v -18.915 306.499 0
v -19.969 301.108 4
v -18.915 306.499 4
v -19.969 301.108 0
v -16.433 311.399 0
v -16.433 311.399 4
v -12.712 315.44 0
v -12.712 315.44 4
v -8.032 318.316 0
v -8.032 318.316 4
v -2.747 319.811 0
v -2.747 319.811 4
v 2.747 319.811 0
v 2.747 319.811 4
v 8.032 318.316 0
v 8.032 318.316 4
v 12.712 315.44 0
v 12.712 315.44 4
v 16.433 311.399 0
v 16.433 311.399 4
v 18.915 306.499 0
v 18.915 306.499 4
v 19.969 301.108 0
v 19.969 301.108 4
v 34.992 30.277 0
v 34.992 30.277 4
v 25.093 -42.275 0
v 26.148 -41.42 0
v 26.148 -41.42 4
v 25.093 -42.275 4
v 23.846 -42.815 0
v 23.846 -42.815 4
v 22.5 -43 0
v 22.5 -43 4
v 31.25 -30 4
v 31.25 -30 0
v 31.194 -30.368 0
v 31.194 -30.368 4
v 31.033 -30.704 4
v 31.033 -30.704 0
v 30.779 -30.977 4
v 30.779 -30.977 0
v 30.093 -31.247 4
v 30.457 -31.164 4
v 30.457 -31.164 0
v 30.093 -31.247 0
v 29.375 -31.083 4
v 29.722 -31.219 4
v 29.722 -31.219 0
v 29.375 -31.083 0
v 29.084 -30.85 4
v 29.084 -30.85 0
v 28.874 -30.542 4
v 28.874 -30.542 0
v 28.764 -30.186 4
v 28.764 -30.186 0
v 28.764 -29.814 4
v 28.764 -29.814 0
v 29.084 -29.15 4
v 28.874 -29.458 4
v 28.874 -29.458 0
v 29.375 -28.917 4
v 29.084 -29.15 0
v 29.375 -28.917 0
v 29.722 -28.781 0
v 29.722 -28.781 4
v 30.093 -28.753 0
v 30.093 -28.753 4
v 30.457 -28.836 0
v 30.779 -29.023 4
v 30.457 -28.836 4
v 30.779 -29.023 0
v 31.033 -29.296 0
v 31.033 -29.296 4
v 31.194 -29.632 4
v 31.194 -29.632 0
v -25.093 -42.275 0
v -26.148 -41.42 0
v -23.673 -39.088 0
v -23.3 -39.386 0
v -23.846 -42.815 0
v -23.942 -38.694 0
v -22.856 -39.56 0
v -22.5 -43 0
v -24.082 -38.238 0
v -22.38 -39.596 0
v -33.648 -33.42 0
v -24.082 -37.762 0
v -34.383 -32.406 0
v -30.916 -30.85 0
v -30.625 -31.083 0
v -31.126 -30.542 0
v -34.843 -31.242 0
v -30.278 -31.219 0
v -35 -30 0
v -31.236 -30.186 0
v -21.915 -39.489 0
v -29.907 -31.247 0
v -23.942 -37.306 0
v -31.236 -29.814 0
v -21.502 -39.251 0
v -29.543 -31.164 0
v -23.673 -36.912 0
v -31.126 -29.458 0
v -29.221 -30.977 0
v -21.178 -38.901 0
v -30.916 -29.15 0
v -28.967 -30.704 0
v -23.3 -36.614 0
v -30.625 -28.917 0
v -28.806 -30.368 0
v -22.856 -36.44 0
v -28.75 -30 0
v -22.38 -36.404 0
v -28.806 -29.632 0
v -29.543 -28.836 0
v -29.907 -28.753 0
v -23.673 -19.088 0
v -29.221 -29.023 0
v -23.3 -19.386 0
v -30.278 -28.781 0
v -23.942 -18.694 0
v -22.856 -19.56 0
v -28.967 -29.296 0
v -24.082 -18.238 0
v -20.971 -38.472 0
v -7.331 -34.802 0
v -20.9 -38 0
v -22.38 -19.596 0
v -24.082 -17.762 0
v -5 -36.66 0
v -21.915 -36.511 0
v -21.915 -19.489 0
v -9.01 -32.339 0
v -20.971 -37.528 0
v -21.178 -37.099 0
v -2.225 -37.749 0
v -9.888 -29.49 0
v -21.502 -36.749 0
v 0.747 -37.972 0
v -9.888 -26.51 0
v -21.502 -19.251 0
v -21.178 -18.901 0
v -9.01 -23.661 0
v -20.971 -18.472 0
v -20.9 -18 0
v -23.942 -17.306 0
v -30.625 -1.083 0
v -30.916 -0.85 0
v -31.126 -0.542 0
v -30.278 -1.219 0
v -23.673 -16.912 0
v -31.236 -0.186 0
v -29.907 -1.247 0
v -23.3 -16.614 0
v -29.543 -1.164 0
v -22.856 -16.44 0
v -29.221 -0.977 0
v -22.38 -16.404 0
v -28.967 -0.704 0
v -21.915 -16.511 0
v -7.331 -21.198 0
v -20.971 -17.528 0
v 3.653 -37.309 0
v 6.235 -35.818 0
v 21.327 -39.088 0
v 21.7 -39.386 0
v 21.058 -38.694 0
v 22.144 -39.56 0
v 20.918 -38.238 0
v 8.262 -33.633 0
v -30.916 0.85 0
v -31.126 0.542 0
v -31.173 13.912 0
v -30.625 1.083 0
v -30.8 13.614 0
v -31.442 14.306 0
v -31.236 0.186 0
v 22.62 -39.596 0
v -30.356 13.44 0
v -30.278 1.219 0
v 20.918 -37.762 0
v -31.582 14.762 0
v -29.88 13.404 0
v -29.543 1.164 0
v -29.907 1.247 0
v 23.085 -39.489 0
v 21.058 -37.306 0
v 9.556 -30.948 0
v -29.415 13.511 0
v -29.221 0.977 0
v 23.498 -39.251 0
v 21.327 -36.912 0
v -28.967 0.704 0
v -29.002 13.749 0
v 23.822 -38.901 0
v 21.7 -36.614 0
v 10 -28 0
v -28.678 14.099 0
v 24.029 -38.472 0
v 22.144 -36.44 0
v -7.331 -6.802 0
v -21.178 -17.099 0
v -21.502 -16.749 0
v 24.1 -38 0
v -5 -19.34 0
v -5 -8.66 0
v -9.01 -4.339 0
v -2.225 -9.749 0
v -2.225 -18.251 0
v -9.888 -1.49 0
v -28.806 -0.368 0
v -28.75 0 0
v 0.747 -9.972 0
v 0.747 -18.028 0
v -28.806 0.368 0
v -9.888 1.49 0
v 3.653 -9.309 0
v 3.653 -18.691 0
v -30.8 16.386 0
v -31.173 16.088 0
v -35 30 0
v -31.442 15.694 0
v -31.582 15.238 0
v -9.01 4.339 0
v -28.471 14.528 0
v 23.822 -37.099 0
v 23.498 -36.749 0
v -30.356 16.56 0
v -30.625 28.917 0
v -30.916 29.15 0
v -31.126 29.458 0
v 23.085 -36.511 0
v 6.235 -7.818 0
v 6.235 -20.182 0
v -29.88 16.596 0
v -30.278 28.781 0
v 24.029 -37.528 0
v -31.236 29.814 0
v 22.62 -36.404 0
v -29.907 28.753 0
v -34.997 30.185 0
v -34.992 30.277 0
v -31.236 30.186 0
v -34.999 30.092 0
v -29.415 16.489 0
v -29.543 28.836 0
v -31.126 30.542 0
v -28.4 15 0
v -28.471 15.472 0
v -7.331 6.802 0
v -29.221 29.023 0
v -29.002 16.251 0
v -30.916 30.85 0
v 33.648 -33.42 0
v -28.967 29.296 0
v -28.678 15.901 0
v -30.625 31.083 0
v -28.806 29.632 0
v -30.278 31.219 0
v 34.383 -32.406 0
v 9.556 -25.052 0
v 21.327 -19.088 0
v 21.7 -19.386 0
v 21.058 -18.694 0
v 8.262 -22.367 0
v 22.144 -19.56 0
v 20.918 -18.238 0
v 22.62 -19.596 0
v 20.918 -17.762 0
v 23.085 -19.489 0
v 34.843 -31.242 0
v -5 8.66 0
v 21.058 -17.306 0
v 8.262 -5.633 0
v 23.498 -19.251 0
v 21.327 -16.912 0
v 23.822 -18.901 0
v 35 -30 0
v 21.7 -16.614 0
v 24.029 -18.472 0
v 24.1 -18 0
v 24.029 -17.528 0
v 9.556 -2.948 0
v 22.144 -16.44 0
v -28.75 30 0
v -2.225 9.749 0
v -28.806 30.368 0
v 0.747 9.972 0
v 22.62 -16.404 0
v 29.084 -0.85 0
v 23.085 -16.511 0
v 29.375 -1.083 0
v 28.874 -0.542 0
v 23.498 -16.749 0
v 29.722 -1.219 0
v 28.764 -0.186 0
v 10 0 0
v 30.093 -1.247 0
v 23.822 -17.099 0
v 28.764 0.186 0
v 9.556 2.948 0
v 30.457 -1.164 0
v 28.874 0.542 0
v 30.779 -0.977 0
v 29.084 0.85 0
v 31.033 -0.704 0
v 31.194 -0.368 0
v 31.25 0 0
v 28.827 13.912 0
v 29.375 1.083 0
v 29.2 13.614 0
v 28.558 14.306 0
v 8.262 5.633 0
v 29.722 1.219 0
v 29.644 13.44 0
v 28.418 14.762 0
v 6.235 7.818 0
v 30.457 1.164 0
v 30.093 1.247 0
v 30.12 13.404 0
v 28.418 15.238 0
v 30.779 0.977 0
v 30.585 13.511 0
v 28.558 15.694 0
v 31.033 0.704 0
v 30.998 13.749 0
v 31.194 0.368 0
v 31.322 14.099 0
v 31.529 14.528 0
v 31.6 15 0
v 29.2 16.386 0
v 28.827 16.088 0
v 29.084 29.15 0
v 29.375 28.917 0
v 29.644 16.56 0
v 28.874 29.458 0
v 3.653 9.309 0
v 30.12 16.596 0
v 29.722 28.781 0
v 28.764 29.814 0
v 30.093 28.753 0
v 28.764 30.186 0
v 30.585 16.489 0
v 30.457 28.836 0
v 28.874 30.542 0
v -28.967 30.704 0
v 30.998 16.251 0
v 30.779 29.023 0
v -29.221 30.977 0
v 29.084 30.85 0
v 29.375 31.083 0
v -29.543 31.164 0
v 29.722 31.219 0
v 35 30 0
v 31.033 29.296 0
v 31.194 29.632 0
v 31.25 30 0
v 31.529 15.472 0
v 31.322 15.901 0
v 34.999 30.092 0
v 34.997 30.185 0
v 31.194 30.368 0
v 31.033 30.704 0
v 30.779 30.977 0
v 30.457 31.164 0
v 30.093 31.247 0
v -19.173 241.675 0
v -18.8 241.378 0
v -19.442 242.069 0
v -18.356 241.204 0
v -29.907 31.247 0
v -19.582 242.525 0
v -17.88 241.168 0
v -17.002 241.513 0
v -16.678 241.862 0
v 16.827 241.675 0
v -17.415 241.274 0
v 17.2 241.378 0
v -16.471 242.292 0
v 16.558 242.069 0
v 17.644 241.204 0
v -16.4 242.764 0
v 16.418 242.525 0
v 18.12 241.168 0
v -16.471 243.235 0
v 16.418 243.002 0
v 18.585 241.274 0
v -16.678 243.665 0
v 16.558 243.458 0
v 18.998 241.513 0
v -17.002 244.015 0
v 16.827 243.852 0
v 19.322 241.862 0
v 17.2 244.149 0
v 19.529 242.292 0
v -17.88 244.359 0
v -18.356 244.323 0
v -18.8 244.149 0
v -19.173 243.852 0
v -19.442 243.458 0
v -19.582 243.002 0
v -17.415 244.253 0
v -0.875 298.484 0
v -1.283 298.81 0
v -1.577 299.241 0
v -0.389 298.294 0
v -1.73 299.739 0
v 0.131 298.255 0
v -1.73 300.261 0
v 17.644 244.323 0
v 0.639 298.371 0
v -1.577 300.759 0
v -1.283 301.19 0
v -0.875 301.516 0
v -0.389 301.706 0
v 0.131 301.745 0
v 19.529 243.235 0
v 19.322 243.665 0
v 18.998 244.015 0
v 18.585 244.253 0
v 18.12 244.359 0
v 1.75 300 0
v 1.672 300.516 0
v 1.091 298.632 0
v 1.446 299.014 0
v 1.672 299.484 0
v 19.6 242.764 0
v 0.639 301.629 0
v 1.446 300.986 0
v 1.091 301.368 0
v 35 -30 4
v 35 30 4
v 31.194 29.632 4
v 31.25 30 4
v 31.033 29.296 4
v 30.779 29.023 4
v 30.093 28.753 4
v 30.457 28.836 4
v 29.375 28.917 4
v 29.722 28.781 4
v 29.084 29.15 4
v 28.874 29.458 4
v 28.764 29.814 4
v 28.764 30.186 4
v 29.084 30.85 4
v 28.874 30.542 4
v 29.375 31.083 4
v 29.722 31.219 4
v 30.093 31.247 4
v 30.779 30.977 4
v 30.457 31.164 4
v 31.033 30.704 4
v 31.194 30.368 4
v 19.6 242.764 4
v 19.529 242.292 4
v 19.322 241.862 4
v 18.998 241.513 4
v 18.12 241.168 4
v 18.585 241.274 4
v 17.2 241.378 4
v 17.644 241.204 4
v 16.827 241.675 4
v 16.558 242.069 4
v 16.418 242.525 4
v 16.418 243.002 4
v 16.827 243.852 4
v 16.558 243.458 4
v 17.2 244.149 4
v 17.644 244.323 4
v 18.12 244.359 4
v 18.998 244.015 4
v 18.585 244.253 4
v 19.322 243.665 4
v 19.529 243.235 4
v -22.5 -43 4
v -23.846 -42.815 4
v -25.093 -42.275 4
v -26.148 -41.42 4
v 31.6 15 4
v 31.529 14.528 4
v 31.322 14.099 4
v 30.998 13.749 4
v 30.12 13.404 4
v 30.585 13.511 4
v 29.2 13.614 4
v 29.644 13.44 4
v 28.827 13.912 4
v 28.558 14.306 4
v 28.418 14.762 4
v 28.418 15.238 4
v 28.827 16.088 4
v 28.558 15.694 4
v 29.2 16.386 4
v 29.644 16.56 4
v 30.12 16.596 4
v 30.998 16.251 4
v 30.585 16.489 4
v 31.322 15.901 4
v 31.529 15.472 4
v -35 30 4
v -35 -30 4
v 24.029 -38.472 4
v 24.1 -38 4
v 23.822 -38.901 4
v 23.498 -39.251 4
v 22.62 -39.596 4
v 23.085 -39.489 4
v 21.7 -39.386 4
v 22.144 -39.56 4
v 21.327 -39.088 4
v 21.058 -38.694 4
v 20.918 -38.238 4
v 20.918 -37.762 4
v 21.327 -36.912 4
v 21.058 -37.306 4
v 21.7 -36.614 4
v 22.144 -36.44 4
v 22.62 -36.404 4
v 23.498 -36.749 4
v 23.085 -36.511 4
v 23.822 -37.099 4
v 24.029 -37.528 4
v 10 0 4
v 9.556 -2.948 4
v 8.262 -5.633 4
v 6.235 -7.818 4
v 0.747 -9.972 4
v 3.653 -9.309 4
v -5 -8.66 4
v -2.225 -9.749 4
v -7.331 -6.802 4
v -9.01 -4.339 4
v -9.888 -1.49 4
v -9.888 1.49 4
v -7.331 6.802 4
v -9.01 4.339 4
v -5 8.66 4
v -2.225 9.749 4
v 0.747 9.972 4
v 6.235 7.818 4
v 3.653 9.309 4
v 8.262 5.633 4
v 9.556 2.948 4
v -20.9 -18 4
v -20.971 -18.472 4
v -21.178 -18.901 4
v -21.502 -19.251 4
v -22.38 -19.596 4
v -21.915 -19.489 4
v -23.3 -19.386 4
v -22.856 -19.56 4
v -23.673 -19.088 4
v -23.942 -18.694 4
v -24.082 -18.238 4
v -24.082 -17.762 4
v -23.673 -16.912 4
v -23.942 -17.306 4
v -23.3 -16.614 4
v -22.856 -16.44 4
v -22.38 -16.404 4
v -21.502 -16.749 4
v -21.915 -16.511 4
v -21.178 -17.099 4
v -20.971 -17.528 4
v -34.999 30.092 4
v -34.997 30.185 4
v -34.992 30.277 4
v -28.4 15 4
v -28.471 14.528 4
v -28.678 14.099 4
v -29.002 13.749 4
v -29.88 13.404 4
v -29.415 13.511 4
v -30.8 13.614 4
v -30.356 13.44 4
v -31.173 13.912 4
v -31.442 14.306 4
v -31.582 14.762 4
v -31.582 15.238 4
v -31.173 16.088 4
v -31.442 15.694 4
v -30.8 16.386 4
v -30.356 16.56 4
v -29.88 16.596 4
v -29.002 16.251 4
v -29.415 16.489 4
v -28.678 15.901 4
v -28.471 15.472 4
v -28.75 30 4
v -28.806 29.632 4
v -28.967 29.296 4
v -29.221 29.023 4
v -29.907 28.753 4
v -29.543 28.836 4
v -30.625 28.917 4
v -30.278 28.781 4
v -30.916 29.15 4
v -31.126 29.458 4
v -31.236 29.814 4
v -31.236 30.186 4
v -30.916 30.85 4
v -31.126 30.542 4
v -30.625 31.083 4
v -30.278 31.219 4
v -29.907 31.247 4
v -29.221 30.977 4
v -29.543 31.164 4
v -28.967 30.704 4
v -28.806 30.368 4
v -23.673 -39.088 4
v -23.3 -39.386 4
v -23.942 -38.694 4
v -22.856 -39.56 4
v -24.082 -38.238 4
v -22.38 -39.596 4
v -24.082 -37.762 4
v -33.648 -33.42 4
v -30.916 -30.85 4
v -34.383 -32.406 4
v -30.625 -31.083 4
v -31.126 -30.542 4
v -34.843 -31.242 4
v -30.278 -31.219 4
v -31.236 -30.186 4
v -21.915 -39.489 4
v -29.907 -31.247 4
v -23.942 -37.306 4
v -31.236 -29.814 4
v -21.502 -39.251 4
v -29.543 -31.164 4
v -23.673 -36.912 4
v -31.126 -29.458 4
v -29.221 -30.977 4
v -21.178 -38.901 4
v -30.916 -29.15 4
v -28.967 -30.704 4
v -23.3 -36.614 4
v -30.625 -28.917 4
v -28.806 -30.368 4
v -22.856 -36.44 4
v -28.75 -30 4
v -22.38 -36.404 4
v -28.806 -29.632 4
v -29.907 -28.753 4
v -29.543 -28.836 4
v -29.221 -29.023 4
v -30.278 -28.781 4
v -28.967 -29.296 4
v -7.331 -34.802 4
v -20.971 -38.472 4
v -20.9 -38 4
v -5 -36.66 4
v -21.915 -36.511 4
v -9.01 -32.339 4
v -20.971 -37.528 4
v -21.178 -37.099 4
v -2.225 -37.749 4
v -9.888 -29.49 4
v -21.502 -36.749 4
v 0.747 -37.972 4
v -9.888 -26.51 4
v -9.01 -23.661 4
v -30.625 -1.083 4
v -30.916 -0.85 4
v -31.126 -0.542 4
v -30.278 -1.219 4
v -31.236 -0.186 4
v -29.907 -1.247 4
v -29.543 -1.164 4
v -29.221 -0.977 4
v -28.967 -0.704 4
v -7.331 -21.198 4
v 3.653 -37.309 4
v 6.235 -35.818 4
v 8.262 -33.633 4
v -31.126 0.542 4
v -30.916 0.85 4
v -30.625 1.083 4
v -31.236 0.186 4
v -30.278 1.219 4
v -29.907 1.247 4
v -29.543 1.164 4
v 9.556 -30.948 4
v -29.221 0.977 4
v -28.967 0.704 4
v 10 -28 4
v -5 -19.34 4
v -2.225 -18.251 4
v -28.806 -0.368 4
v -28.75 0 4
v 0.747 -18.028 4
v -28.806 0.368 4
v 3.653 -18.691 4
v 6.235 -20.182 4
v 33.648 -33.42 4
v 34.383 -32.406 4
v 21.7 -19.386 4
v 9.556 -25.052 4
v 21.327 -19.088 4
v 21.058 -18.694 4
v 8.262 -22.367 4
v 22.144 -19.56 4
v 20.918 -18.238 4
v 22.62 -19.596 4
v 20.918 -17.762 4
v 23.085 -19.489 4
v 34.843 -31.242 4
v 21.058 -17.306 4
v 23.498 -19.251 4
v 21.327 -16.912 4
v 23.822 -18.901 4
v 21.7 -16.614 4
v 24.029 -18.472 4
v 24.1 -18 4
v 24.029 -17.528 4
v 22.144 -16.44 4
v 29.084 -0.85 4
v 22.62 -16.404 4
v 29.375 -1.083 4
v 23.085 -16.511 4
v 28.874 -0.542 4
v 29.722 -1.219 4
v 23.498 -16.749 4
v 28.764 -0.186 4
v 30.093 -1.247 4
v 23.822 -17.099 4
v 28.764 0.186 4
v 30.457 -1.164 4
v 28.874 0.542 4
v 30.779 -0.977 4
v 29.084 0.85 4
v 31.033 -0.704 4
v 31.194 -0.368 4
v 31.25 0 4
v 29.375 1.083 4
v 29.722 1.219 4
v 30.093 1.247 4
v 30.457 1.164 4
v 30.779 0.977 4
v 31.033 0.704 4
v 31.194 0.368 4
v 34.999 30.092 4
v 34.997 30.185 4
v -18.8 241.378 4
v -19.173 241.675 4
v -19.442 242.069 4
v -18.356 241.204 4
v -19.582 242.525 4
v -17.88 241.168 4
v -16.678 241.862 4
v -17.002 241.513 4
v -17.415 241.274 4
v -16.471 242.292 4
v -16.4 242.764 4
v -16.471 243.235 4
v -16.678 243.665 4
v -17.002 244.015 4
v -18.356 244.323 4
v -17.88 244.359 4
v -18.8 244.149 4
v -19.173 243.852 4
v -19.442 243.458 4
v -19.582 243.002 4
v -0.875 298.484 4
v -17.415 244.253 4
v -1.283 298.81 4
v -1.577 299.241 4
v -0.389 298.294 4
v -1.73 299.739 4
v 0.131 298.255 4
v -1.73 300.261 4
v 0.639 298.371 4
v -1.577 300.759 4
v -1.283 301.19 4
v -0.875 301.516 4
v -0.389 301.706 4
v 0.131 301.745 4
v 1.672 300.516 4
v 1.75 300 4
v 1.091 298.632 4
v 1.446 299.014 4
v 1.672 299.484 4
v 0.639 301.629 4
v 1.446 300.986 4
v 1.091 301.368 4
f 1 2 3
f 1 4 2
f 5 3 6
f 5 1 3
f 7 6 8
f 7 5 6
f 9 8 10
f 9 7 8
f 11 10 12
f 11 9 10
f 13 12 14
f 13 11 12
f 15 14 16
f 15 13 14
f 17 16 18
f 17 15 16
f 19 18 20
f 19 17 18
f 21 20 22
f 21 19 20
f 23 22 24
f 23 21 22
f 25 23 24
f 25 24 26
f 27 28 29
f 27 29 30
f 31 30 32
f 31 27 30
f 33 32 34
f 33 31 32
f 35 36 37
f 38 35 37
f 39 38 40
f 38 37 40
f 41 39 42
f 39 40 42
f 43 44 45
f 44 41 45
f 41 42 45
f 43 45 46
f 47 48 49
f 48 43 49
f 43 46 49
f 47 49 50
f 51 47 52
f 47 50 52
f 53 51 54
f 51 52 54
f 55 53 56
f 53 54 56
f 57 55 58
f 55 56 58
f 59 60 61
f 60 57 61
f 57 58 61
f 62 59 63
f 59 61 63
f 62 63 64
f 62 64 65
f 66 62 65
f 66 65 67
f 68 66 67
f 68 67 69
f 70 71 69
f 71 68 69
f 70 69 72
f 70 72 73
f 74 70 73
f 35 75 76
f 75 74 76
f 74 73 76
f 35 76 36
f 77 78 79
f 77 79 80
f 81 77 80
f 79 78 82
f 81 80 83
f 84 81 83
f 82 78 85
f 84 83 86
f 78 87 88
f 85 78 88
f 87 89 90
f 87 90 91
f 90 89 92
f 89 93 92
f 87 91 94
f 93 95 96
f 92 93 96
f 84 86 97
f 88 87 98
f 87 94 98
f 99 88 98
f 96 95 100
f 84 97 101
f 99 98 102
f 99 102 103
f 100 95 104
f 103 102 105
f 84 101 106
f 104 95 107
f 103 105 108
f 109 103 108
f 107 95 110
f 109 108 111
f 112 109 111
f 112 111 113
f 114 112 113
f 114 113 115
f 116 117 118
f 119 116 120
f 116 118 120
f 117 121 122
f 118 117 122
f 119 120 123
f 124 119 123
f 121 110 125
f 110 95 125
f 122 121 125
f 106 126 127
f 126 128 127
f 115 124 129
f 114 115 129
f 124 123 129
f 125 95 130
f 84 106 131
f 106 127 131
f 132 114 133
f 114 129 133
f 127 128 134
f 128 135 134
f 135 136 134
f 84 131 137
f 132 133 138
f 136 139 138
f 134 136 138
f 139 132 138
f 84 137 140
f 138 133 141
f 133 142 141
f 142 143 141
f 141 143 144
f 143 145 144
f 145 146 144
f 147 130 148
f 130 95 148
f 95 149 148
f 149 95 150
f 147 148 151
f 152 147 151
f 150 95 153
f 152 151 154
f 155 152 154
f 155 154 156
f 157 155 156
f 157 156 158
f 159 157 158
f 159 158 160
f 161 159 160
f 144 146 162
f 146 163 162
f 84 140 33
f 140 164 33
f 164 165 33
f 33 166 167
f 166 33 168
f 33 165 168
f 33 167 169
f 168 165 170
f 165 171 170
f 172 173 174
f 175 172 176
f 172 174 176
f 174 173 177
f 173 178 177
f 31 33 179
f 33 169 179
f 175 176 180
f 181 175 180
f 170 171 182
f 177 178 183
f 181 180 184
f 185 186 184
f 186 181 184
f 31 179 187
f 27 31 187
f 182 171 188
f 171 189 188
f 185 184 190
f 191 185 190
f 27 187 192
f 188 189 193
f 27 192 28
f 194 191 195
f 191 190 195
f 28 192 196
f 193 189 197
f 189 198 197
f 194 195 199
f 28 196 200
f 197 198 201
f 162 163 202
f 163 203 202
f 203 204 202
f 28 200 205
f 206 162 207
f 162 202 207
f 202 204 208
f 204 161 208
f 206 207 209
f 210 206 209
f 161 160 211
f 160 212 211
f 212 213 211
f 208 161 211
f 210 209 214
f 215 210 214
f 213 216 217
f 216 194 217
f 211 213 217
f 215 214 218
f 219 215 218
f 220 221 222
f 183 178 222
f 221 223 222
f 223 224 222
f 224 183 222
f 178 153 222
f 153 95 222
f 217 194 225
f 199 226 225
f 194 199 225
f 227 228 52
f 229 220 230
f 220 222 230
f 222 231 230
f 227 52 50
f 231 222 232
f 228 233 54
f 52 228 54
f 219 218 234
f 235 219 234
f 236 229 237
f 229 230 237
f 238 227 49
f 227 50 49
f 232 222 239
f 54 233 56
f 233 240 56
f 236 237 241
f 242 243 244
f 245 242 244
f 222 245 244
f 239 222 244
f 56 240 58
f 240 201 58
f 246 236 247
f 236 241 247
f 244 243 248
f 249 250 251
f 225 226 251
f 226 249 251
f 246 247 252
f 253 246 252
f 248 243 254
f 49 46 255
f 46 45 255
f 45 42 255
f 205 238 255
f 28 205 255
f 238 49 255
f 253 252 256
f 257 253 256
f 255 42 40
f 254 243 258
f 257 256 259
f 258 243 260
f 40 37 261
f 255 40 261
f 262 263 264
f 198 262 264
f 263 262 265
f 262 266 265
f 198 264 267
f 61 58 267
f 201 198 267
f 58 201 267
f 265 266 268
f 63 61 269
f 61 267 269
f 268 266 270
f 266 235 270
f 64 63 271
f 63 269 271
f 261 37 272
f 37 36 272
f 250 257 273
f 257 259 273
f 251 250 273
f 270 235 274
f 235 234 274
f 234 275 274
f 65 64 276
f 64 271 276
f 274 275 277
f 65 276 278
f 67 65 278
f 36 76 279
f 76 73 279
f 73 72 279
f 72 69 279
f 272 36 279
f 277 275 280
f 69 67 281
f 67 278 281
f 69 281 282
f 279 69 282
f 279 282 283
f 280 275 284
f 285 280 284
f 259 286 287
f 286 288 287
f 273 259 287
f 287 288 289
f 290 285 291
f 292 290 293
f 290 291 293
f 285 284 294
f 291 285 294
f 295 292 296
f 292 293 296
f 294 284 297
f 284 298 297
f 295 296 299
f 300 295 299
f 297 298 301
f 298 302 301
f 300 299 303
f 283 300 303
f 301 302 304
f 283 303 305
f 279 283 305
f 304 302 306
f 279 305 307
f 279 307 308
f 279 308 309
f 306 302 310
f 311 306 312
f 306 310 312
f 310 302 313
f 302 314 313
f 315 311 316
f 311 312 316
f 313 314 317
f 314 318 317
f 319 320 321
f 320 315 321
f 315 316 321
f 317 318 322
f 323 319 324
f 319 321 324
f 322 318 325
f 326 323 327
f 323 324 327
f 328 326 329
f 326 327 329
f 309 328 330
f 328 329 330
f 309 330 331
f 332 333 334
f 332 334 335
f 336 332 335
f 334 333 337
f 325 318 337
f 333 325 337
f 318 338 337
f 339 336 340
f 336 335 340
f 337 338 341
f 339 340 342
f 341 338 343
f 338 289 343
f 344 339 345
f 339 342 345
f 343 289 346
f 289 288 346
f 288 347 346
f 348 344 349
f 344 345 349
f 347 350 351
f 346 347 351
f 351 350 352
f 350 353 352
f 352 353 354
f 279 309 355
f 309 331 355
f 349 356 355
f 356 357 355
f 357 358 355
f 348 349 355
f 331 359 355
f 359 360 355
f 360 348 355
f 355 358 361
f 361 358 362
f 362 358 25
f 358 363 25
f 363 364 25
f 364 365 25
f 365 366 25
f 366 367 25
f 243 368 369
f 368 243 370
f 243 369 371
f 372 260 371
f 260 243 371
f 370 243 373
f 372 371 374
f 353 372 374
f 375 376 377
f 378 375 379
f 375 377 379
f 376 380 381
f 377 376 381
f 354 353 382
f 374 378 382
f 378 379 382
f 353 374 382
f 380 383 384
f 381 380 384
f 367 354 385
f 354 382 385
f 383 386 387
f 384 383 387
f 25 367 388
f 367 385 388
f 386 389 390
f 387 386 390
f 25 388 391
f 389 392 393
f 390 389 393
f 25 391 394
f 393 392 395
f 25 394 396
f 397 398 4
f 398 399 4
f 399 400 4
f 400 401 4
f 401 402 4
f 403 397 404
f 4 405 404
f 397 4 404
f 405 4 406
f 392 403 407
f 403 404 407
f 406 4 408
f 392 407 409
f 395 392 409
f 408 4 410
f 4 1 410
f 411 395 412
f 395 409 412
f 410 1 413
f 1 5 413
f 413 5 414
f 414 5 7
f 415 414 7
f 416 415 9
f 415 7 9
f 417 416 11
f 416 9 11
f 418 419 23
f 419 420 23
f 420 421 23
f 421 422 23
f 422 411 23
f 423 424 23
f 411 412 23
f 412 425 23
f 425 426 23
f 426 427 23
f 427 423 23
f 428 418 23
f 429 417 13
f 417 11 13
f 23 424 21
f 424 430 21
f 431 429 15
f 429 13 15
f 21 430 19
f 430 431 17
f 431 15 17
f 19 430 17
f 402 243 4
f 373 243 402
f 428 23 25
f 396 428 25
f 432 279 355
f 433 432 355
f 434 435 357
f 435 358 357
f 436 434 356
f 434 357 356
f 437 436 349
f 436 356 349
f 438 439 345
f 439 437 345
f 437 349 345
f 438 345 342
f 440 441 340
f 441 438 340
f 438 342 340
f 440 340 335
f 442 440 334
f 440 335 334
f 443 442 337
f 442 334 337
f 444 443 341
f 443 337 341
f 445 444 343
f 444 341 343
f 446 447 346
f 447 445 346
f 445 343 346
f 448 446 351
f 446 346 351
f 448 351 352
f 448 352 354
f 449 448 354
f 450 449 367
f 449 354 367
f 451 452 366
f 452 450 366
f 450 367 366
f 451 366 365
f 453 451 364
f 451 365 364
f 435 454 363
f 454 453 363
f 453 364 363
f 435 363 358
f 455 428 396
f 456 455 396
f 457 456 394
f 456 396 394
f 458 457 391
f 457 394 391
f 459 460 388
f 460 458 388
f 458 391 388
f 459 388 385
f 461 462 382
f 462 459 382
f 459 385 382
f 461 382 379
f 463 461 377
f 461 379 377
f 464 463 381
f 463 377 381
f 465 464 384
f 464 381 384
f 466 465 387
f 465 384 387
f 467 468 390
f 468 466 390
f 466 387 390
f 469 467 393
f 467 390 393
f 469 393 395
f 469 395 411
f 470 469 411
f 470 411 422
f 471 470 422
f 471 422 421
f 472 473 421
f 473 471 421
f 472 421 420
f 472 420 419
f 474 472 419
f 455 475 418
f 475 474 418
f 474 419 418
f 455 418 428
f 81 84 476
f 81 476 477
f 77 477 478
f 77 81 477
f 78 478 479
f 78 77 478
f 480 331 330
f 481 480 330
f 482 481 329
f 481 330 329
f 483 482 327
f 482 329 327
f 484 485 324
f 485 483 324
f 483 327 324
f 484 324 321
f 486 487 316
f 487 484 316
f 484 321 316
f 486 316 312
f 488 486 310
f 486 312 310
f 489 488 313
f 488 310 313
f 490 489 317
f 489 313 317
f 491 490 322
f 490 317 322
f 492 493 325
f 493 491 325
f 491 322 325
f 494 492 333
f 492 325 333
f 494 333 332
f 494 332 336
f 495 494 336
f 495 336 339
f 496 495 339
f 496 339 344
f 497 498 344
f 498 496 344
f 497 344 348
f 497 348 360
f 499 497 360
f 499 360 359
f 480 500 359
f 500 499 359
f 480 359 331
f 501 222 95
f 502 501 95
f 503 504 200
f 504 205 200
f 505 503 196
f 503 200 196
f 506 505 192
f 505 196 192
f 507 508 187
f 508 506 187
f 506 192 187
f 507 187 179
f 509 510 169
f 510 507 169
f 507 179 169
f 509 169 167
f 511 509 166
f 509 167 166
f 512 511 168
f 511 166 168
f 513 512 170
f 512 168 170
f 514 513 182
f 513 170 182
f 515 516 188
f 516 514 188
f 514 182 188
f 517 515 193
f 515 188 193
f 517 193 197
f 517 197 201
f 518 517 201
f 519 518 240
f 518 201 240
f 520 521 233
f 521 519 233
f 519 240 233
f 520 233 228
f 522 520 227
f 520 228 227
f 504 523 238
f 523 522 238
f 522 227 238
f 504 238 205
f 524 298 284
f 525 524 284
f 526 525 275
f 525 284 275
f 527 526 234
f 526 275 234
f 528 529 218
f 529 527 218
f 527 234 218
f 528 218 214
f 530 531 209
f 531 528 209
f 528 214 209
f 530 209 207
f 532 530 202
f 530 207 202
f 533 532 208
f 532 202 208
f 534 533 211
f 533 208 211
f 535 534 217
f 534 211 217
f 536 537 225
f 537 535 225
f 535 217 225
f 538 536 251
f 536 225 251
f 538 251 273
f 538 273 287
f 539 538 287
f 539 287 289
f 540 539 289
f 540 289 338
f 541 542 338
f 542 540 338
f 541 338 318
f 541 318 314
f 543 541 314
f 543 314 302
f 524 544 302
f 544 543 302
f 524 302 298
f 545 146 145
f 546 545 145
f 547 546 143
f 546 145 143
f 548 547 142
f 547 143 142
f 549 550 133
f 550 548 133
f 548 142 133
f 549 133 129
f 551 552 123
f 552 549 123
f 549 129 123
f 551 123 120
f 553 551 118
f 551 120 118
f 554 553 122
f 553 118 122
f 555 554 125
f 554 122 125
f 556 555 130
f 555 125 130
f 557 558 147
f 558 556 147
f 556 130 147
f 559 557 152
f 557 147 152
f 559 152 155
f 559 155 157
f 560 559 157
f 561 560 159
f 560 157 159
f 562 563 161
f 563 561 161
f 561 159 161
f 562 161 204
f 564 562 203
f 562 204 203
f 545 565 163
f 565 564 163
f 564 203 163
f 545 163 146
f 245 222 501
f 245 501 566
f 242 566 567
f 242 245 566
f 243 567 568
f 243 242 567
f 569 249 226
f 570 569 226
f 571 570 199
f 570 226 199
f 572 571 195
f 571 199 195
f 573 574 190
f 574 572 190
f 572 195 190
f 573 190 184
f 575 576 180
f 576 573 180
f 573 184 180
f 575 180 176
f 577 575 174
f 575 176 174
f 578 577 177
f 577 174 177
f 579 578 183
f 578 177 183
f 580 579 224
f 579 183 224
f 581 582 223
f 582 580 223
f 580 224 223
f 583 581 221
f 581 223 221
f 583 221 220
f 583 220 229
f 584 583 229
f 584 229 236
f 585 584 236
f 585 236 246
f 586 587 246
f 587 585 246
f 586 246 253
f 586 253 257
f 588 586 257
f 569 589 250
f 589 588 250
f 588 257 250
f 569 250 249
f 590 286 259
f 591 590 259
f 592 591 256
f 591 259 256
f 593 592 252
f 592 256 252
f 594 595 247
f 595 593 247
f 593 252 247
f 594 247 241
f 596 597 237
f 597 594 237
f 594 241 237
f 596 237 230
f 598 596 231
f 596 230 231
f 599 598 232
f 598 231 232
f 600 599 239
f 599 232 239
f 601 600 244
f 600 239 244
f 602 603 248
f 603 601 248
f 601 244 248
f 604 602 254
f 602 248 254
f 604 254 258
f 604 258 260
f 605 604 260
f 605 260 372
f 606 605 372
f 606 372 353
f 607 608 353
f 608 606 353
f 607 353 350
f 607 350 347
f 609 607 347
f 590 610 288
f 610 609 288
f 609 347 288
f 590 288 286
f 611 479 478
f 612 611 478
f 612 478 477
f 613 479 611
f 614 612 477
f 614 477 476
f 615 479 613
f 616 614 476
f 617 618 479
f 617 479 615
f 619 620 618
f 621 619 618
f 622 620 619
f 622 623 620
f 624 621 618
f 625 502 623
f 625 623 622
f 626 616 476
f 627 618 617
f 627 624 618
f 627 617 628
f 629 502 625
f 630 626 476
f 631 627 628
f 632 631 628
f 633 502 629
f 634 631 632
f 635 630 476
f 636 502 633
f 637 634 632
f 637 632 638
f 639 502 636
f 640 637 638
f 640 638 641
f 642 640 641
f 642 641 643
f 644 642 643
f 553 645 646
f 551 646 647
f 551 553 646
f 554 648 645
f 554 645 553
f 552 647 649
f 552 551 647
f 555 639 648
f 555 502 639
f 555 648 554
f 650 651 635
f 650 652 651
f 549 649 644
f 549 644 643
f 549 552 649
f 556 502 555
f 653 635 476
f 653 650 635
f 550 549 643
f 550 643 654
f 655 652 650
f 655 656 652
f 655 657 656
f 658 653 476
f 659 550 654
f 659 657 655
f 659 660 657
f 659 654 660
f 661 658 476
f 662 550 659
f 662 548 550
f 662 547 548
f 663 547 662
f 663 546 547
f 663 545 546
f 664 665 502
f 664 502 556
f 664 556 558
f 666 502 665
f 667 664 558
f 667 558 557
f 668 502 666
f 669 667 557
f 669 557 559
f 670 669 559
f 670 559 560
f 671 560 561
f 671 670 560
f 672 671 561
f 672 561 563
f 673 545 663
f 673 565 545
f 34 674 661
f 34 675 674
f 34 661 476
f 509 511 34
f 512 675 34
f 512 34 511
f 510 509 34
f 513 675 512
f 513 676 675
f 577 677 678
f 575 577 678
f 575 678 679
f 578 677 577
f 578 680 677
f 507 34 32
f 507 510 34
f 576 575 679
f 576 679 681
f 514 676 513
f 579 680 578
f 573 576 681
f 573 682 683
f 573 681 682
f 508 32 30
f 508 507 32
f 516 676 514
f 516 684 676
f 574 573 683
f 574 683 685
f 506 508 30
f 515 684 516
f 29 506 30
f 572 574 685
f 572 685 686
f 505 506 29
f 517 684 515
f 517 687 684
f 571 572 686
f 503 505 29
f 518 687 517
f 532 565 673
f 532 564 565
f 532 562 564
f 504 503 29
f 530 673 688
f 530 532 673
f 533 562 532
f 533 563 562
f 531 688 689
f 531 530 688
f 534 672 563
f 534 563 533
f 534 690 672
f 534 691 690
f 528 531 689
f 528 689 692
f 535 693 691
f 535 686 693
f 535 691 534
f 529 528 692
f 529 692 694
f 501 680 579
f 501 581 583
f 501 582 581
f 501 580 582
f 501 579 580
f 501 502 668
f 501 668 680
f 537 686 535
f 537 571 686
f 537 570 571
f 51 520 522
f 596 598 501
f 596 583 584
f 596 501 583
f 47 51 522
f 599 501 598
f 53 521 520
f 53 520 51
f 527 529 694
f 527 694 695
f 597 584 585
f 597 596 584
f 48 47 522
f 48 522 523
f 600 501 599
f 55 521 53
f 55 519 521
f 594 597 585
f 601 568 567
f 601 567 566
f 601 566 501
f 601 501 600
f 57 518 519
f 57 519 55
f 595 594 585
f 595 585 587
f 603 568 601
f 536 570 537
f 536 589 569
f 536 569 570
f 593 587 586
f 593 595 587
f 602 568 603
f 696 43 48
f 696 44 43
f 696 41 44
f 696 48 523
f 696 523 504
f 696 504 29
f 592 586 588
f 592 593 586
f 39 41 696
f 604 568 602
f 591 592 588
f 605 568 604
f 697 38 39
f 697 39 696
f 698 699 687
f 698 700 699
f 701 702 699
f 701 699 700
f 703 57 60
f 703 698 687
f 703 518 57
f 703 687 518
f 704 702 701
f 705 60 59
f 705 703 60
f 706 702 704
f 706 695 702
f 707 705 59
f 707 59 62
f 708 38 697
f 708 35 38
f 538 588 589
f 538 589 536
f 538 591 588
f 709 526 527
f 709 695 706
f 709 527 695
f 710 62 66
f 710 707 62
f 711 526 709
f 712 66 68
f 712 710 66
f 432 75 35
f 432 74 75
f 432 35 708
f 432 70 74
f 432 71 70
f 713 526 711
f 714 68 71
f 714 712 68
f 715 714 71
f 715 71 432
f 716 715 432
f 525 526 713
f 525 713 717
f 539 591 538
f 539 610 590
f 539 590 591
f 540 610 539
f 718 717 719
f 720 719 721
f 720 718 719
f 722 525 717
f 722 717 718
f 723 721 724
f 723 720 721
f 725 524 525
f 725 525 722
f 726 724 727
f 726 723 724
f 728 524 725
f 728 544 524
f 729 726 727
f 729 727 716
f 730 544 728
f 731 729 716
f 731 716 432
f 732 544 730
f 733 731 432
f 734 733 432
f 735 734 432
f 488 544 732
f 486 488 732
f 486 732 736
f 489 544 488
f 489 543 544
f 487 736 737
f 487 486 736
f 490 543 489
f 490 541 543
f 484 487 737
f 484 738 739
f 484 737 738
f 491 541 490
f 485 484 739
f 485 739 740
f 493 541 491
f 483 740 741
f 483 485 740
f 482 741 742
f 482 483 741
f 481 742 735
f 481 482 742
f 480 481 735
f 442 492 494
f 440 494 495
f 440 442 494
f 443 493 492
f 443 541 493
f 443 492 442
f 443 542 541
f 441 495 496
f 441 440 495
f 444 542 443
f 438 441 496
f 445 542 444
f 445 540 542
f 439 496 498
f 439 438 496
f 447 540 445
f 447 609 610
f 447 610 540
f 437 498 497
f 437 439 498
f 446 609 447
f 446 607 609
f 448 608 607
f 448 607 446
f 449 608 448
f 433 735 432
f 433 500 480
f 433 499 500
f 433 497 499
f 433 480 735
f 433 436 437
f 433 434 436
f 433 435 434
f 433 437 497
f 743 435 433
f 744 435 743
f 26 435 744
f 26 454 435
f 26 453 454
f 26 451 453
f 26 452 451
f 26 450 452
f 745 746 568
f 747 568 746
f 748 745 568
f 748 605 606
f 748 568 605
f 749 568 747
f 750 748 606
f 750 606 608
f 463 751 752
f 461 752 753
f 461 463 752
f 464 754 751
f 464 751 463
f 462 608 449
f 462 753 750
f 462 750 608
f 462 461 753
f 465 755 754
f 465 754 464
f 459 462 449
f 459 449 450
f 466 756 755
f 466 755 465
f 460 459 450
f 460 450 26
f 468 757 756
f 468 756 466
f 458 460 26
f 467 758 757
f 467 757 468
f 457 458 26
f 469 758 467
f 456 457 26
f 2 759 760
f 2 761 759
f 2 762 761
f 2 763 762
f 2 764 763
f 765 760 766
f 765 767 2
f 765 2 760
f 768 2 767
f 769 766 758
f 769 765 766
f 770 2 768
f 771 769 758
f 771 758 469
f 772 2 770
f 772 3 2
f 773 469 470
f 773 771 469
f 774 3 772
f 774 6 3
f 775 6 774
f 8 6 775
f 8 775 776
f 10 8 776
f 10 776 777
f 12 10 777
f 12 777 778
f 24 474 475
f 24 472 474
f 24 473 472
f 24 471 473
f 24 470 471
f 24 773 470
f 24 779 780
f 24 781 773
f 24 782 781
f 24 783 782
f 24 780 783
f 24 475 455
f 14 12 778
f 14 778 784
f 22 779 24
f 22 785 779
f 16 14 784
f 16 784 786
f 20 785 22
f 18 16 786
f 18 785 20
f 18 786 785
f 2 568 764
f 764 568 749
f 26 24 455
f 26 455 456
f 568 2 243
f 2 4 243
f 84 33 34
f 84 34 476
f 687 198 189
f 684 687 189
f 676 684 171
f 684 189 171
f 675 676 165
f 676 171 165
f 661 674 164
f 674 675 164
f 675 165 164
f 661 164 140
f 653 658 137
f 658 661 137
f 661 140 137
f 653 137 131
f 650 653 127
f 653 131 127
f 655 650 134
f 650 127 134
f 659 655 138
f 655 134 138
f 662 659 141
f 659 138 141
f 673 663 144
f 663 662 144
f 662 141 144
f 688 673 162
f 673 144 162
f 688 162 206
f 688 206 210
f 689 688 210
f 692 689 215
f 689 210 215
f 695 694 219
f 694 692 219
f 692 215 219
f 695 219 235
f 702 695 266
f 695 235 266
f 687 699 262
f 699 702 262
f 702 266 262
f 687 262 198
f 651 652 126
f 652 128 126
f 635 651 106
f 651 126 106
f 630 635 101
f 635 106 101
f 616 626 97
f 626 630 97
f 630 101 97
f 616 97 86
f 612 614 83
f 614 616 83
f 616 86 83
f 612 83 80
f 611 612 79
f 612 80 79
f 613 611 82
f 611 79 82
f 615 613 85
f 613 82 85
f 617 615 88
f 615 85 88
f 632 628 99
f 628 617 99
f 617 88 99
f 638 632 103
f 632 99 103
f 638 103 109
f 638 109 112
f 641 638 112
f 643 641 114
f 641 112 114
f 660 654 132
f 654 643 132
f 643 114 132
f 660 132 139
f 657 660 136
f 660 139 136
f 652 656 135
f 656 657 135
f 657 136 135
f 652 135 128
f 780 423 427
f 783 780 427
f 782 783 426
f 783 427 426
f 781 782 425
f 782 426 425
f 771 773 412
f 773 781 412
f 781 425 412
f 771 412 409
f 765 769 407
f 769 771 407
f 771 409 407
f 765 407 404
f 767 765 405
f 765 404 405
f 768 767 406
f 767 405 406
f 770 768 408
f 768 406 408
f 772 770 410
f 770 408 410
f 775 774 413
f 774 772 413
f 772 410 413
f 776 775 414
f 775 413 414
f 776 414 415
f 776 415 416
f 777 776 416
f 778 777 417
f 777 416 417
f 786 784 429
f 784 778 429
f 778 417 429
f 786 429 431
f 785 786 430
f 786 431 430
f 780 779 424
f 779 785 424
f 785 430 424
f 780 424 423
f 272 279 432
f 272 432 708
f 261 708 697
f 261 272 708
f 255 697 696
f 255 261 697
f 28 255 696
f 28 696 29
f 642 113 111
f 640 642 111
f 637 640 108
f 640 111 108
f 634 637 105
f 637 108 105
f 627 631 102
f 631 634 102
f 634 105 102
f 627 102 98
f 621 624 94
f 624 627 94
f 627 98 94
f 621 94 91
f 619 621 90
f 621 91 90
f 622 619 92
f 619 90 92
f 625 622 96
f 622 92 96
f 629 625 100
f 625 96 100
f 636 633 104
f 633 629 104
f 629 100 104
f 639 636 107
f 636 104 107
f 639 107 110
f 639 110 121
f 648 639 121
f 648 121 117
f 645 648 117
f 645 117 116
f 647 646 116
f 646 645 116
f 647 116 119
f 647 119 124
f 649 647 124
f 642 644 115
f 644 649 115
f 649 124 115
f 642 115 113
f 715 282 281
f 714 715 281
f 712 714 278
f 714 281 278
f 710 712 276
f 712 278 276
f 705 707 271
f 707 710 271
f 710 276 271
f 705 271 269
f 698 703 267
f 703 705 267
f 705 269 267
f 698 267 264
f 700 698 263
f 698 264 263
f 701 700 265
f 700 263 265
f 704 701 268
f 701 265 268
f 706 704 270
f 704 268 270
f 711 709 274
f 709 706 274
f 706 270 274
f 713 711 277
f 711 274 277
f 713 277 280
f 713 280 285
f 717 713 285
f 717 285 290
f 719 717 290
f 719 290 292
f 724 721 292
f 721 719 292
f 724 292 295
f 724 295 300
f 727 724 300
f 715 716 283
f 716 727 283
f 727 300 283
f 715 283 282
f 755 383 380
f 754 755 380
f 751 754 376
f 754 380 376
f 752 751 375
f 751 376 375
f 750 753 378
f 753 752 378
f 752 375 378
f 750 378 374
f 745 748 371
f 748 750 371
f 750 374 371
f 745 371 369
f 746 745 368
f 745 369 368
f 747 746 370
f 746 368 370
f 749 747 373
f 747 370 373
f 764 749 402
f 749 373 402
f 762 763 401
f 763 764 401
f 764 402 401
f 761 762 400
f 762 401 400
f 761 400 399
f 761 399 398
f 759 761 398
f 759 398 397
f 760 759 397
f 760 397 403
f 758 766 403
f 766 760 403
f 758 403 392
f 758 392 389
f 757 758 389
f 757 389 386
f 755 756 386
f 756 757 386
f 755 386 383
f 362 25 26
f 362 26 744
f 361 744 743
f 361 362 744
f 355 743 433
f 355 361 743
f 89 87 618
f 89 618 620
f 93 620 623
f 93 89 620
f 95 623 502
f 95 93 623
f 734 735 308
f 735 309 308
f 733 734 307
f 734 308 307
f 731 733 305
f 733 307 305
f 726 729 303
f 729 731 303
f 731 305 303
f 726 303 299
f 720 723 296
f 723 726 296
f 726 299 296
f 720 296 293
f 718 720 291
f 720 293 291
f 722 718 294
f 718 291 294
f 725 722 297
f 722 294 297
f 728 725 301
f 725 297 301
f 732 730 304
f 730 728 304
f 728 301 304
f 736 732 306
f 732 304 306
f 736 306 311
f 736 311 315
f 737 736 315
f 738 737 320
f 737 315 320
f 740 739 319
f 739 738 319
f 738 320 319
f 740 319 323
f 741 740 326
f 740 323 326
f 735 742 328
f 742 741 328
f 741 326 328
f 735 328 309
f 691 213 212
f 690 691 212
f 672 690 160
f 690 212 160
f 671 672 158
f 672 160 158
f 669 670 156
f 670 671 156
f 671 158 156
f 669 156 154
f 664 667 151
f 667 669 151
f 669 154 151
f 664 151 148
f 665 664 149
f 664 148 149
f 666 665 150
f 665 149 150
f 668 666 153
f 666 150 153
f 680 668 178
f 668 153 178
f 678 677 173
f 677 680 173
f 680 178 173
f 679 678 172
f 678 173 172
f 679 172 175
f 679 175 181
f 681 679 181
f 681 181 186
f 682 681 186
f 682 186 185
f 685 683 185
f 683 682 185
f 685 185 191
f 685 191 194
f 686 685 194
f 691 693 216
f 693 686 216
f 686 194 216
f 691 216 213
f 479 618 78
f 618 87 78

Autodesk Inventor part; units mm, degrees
ref_plane "YZ Plane" through (0, 0, 0) normal (1, 0, 0) x (0, 1, 0)
ref_plane "XZ Plane" through (0, 0, 0) normal (0, 1, 0) x (-1, 0, 0)
ref_plane "XY Plane" through (0, 0, 0) normal (0, 0, 1) x (1, 0, 0)
sketch "スケッチ1" plane through (0, 0, 0) normal (0, 0, 1) x (1, 0, 0)
  circle A0 centre (0, 0) radius 10
  circle A1 centre (0, 0) radius 50 construction
  circle A2 centre (0, -28) radius 11.9375 construction
  circle A3 centre (-0.2119, 34.8748) radius 11.9375 construction
  circle A4 centre (0, -28) radius 15.9375 construction
  circle A5 centre (0, 0) radius 4 construction
  circle A6 centre (0, -28) radius 22.5 construction
  circle A7 centre (0, 300) radius 5 construction
  circle A8 centre (0, 300) radius 47.7465 construction
  line L0 (47.4611, 294.7873) -> (11.8661, -29.3033) construction
  line L1 (-47.4611, 294.7873) -> (-11.8661, -29.3033) construction
  circle A9 centre (-0.2119, 34.8748) radius 19.25 construction
  line L2 (-12.0776, 316.763) -> (11.6547, 316.763) construction
  line L3 (-22.6185, -92.0395) -> (22.1946, -92.0395) construction
  line L4 (22.5, -18) -> (-22.5, -18) construction
  line L5 (-22.5, -18) -> (-22.5, -38) construction
  line L6 (-22.5, -38) -> (22.5, -38) construction
  line L7 (22.5, -38) -> (22.5, -18) construction
  line L8 (22.5, -18) -> (-22.5, -38) construction
  line L9 (-22.5, -18) -> (22.5, -38) construction
  circle A10 centre (-22.5, -18) radius 1.6
  circle A11 centre (22.5, -18) radius 1.6
  circle A12 centre (22.5, -38) radius 1.6
  circle A13 centre (-22.5, -38) radius 1.6
  line L10 (30, 30) -> (-30, 30) construction
  line L11 (-30, 30) -> (-30, -30) construction
  line L12 (-30, -30) -> (30, -30) construction
  line L13 (30, -30) -> (30, 30) construction
  line L14 (30, 30) -> (-30, -30) construction
  line L15 (-30, 30) -> (30, -30) construction
  circle A14 centre (-30, 30) radius 1.25
  circle A15 centre (30, 30) radius 1.25
  circle A16 centre (30, -30) radius 1.25
  circle A17 centre (-30, -30) radius 1.25
  circle A18 centre (0, -28) radius 10
  circle A19 centre (0, 300) radius 1.75
  arc A20 (35, 30) -> (34.9923, 30.2769) centre (30, 30) ccw
  arc A21 (33.6477, -33.4197) -> (35, -30) centre (30, -30) ccw
  arc A22 (22.5, -43) -> (26.1477, -41.4197) centre (22.5, -38) ccw
  arc A23 (-26.1477, -41.4197) -> (-22.5, -43) centre (-22.5, -38) ccw
  arc A24 (-35, -30) -> (-33.6477, -33.4197) centre (-30, -30) ccw
  arc A25 (-34.9923, 30.2769) -> (-35, 30) centre (-30, 30) ccw
  arc A26 (19.9693, 301.1077) -> (-19.9693, 301.1077) centre (0, 300) ccw
  line L16 (-19.9693, 301.1077) -> (-34.9923, 30.2769)
  line L17 (-33.6477, -33.4197) -> (-26.1477, -41.4197)
  line L18 (19.9693, 301.1077) -> (34.9923, 30.2769)
  line L19 (33.6477, -33.4197) -> (26.1477, -41.4197)
  line L20 (22.5, -43) -> (-22.5, -43)
  circle A27 centre (-30, 0) radius 1.25
  circle A28 centre (30, 0) radius 1.25
  line L21 (-35, 30) -> (-35, -30)
  line L22 (35, -30) -> (35, 30)
  circle A29 centre (-30, 15) radius 1.6
  circle A30 centre (30, 15) radius 1.6
  circle A31 centre (-18, 242.7636) radius 1.6
  circle A32 centre (18, 242.7636) radius 1.6
  circle A33 centre (0, 300) radius 60 construction
  point P0 (0, 0)
  dimension "d0" = 20
  dimension "d1" = 100
  dimension "d11" = 23.875
  dimension "d12" = 23.875
  dimension "d16" = 8
  dimension "d17" = 45
  dimension "d18" = 28
  dimension "d19" = 4
  dimension "d26" = 10
  dimension "d27" = 300
  dimension "d28" = 95.493
  dimension "d30" = 38.5
  dimension "d36" = 45
  dimension "d37" = 20
  dimension "d38" = 3.2
  dimension "d39" = 3.2
  dimension "d40" = 3.2
  dimension "d41" = 3.2
  dimension "d46" = 60
  dimension "d47" = 60
  dimension "d48" = 2.5
  dimension "d49" = 2.5
  dimension "d50" = 2.5
  dimension "d51" = 2.5
  dimension "d52" = 20
  dimension "d53" = 3.5
  dimension "d55" = 5
  dimension "d56" = 5
  dimension "d57" = 20
  dimension "d58" = 5
  dimension "d59" = 5
  dimension "d60" = 5
  dimension "d61" = 5
  dimension "d64" = 2.5
  dimension "d65" = 2.5
  dimension "d66" = 3.2
  dimension "d67" = 3.2
  dimension "d68" = 15
  dimension "d69" = 3.2
  dimension "d70" = 3.2
  dimension "d71" = 120
  dimension "d72" = 36
extrude "押し出し2" add sketch "スケッチ1" along normal blind 4
properties part number "関節3_側板1" material "アルミニウム 6061"
